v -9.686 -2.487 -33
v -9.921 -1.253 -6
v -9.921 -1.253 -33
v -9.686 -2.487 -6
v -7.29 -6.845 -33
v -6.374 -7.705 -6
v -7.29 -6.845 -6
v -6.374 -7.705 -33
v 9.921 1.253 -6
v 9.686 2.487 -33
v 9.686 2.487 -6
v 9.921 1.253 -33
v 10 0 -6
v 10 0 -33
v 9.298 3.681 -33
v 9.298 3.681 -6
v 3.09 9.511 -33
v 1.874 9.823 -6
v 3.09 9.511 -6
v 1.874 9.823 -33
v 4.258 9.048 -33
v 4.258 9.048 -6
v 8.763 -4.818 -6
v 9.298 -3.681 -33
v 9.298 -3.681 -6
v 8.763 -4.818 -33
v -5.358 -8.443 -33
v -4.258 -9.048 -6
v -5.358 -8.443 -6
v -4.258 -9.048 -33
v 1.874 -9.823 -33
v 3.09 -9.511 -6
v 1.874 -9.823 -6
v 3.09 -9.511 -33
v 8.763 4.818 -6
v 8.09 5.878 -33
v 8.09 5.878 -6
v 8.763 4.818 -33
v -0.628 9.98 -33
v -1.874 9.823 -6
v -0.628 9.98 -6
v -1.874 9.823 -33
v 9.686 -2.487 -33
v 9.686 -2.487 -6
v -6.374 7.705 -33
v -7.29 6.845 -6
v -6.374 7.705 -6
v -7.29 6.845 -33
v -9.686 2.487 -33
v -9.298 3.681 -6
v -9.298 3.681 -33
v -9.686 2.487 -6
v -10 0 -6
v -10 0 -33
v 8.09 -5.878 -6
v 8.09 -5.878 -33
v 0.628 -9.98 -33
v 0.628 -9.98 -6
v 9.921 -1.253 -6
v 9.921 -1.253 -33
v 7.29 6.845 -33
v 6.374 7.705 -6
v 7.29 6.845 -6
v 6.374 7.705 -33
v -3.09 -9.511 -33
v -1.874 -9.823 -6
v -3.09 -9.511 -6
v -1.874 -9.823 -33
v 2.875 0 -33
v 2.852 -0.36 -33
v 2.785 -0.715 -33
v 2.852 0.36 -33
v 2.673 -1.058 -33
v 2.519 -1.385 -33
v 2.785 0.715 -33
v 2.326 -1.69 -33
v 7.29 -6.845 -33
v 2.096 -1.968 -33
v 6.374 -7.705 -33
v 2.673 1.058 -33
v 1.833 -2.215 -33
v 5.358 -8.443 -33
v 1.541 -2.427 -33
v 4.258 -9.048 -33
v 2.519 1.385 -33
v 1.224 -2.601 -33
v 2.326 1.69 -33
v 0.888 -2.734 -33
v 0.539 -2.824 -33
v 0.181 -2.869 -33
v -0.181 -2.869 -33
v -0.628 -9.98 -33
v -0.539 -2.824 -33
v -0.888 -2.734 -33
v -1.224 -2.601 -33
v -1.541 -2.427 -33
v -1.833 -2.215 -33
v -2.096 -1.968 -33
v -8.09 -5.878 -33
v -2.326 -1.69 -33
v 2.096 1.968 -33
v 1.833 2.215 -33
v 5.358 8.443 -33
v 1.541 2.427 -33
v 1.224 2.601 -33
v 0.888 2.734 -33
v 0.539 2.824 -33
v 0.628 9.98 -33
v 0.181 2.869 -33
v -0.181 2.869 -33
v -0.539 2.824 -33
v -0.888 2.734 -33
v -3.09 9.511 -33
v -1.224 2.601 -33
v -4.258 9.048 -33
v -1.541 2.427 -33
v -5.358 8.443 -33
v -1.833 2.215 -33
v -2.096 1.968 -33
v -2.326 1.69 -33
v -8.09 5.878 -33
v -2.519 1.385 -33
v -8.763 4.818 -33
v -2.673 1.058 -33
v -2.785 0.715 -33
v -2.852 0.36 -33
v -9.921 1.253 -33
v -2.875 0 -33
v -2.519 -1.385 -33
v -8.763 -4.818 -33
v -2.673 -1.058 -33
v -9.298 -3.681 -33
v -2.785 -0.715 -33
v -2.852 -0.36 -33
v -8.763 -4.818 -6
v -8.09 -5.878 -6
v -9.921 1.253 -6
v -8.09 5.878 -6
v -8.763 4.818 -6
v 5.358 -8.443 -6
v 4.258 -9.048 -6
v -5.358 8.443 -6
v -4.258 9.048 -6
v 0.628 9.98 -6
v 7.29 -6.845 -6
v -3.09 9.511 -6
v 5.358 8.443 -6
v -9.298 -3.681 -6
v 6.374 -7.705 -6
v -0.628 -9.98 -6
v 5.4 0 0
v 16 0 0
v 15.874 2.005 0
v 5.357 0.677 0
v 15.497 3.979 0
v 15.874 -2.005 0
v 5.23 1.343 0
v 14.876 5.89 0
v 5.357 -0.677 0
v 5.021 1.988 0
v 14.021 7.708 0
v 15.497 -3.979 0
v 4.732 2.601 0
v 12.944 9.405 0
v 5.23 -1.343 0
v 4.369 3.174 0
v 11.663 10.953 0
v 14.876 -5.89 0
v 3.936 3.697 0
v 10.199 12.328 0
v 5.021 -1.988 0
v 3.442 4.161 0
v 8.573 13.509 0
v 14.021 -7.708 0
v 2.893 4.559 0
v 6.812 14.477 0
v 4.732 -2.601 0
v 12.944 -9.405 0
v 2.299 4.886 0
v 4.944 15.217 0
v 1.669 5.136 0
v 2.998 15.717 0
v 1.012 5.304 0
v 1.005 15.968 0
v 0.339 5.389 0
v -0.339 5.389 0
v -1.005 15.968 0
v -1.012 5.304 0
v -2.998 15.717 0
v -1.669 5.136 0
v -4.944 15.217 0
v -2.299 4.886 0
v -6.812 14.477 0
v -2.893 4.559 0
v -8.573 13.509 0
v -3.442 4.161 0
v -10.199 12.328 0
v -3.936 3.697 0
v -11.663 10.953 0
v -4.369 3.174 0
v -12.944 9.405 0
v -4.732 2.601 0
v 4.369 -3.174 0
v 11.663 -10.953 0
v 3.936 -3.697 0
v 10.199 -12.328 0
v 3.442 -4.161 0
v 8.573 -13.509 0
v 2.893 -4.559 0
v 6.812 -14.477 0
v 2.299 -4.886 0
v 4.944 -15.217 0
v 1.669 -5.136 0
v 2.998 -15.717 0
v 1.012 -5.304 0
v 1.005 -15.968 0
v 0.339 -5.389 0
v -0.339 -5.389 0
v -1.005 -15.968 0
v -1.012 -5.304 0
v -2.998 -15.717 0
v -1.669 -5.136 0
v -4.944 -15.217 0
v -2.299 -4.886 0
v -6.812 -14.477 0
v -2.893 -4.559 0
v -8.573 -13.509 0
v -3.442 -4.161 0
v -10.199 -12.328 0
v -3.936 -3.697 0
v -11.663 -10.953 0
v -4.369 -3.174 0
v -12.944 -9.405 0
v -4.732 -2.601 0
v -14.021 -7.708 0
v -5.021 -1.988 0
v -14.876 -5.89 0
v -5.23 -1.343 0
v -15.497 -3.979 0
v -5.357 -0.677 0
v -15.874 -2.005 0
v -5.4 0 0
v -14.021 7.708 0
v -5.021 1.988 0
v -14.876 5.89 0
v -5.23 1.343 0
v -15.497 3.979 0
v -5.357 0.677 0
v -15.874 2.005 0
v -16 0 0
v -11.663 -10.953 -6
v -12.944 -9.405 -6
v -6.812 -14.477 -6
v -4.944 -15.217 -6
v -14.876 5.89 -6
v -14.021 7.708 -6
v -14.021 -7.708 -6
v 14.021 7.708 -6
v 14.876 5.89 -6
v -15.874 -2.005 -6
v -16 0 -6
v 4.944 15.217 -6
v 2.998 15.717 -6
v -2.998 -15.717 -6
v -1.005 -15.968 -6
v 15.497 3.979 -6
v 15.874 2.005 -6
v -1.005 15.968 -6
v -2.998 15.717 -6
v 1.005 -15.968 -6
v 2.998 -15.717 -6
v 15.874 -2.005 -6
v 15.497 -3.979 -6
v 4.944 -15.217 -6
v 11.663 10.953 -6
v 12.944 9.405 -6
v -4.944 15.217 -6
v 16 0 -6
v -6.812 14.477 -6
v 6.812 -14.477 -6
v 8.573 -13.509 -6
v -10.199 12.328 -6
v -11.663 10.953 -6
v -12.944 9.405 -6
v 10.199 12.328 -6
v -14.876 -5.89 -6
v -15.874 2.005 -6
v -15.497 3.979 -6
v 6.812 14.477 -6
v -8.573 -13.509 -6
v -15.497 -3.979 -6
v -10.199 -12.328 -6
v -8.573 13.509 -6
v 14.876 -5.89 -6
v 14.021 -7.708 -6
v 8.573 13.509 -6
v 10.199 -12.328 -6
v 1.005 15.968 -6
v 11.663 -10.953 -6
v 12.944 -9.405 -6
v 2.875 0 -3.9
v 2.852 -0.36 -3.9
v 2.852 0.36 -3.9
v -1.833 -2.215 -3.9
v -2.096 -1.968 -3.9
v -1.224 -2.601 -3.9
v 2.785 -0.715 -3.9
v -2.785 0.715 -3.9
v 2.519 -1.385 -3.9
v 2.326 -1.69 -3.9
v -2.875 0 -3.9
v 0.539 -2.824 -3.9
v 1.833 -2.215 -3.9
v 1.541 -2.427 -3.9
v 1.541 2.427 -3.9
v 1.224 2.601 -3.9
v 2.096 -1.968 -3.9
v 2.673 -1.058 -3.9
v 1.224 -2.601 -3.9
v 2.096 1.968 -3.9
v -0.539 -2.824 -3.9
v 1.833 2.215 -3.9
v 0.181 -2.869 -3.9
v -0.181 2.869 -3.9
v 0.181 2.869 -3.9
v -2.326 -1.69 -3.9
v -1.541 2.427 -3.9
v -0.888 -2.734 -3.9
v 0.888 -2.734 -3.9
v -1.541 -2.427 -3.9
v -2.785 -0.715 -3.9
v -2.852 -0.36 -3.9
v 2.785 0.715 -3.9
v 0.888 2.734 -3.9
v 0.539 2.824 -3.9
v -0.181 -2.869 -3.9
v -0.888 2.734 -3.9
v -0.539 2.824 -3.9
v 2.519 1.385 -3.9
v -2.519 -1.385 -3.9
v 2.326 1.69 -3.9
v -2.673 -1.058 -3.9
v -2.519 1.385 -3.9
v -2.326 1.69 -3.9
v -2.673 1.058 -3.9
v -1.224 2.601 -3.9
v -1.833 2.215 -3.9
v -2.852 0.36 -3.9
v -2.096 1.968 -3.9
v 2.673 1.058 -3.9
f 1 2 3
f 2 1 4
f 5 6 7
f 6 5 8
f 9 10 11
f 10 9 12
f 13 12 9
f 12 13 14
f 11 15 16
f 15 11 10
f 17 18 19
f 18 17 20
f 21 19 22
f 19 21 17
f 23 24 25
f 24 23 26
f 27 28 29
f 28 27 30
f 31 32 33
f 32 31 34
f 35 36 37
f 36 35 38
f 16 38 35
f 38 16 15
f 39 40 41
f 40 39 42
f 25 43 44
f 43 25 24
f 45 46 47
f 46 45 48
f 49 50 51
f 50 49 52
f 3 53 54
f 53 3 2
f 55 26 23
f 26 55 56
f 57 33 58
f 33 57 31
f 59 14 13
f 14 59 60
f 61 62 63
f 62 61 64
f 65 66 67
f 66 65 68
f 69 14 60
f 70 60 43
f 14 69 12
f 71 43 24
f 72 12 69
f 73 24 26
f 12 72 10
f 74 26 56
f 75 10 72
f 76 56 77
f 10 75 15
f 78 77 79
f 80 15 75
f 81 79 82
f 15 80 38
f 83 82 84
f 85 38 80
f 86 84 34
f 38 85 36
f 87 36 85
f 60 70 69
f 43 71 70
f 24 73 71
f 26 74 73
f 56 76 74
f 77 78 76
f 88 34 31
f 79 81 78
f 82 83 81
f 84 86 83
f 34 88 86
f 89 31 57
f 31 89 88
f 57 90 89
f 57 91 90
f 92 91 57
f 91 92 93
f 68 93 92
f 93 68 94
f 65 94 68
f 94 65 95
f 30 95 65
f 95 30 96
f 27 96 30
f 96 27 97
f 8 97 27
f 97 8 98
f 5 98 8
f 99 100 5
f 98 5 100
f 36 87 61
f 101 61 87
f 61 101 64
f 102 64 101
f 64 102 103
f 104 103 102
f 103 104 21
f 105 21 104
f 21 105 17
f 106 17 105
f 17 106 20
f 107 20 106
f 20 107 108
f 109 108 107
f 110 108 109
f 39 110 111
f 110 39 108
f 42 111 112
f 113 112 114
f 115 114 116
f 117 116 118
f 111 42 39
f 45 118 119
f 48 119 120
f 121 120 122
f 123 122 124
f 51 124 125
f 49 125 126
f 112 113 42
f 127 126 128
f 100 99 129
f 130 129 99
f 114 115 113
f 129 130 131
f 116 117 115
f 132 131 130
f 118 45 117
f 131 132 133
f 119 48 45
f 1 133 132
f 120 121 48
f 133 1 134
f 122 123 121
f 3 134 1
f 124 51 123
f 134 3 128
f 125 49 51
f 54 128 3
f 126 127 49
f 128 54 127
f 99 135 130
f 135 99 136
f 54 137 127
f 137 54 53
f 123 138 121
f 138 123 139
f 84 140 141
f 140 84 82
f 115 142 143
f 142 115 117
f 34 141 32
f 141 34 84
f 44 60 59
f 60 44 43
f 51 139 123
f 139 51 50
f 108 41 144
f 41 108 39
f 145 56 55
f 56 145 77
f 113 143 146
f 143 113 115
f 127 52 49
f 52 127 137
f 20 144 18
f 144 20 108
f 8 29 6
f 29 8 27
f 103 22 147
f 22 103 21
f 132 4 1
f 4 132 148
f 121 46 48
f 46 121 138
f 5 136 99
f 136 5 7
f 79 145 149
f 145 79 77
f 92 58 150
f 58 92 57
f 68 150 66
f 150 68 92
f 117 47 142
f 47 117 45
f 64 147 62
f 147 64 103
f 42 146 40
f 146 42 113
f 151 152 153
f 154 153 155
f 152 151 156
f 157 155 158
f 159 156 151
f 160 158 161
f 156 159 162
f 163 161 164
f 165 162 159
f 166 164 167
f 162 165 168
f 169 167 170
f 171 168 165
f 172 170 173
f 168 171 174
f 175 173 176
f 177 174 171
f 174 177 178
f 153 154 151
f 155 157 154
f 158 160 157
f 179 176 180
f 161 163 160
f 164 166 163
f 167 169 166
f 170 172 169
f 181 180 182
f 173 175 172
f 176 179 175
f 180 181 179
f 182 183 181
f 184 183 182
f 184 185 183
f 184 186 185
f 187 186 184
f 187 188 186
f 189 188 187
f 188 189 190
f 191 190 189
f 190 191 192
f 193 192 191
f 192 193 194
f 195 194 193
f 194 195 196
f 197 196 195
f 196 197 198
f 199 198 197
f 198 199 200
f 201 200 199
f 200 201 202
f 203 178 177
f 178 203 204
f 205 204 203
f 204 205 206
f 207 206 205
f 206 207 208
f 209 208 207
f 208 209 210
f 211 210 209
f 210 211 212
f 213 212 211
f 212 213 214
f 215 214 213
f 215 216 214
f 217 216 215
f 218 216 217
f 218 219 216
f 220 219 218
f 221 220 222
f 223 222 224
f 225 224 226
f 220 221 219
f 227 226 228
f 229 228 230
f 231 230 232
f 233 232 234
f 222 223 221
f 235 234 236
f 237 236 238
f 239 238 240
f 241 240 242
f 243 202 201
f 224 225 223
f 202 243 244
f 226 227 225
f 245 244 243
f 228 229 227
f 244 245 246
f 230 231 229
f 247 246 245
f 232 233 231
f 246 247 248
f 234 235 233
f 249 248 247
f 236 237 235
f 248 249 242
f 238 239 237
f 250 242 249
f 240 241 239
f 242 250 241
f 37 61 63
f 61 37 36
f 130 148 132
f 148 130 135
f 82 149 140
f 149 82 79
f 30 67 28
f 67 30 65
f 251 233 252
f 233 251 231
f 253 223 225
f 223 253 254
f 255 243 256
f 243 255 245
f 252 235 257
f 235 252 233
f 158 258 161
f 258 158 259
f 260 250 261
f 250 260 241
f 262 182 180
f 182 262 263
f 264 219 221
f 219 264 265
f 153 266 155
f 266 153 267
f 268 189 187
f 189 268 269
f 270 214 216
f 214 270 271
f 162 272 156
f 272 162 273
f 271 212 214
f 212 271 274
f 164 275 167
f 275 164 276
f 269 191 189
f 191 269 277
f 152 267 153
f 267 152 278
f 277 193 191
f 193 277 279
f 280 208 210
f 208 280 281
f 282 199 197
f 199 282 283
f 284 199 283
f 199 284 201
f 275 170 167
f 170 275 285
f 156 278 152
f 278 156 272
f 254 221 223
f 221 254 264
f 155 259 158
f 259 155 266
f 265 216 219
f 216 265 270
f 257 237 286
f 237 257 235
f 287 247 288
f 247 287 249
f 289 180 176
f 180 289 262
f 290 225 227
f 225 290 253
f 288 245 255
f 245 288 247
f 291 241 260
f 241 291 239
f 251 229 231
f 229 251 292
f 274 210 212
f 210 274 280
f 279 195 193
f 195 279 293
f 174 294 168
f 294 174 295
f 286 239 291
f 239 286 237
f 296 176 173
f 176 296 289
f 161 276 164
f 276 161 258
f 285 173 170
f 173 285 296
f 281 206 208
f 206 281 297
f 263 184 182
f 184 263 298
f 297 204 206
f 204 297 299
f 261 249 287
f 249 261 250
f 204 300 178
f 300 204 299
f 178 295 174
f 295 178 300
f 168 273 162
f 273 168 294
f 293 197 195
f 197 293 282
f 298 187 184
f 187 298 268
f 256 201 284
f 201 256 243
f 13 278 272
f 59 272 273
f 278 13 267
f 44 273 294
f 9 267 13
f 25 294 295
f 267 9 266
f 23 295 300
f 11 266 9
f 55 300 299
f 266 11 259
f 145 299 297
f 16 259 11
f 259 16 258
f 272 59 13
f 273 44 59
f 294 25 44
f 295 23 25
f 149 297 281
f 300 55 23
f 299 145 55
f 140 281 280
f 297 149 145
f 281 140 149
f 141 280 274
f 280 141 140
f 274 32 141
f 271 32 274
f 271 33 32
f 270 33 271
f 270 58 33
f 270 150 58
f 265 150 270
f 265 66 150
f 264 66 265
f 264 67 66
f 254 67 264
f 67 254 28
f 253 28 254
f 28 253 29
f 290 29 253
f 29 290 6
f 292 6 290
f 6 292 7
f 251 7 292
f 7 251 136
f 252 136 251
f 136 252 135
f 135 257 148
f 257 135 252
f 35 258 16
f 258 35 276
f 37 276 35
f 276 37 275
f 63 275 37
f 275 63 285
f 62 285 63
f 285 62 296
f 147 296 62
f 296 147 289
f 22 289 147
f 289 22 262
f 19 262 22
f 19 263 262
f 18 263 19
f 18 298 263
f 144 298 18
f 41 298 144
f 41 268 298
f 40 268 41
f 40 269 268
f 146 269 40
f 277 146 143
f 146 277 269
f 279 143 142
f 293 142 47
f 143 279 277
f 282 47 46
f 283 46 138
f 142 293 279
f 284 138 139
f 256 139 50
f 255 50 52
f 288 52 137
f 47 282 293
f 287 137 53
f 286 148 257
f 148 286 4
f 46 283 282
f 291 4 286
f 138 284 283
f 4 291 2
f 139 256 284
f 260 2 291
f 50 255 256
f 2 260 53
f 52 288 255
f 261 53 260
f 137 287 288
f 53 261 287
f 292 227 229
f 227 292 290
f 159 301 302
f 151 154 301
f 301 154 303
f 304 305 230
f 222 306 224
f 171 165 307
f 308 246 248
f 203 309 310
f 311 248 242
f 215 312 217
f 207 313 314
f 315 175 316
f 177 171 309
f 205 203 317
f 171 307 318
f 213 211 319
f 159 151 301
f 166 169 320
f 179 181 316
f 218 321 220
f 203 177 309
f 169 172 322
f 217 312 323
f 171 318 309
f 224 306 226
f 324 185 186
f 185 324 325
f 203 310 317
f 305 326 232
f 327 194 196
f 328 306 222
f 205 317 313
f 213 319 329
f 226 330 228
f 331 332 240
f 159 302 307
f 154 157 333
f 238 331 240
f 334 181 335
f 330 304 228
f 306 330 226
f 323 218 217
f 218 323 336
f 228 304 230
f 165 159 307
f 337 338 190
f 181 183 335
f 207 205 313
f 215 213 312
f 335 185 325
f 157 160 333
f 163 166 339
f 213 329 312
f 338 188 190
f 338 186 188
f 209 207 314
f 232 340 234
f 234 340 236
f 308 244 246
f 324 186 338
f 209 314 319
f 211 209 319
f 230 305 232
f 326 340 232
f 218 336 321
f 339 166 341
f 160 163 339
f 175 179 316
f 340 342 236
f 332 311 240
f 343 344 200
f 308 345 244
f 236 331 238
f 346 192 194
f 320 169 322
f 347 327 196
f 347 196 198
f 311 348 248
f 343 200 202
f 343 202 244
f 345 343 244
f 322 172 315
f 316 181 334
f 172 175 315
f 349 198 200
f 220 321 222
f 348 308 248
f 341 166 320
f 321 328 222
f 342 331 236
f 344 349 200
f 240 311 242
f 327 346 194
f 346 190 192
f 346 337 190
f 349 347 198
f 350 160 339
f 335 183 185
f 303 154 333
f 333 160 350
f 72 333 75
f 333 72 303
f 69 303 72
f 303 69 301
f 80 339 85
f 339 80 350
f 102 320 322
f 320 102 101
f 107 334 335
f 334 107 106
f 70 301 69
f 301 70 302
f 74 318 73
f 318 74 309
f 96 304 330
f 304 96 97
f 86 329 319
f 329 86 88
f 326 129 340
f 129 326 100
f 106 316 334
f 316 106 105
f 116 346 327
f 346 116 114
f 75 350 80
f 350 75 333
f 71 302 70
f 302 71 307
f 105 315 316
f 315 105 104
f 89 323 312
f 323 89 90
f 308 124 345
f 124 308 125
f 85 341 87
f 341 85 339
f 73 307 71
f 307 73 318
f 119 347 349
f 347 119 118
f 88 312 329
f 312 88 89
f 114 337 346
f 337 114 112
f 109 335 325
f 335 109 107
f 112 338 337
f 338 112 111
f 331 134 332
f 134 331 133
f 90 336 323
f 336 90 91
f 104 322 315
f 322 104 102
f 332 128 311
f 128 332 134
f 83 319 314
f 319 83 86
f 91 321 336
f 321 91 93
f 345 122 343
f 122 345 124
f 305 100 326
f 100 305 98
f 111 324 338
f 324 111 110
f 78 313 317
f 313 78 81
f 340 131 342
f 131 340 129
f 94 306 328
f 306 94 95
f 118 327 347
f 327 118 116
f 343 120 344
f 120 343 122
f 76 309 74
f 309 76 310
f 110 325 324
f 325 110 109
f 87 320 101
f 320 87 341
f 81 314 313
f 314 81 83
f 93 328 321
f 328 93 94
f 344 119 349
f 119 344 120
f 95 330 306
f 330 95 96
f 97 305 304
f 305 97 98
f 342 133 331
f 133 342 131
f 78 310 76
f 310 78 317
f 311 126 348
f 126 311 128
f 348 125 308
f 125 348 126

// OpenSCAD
$fn = 50;


difference() {
	union() {
		translate(v = [0, 0, -33.0000000000]) {
			cylinder(h = 33, r = 10.0000000000);
		}
		translate(v = [0, 0, -6.0000000000]) {
			cylinder(h = 6, r = 16.0000000000);
		}
	}
	union() {
		translate(v = [0, 0, 0]) {
			rotate(a = [0, 0, 0]) {
				difference() {
					union() {
						#translate(v = [0, 0, -33.0000000000]) {
							cylinder(h = 33, r = 2.6000000000);
						}
						#translate(v = [0, 0, -3.9000000000]) {
							cylinder(h = 3.9000000000, r1 = 2.8750000000, r2 = 5.4000000000);
						}
						#translate(v = [0, 0, -33.0000000000]) {
							cylinder(h = 33, r = 2.8750000000);
						}
						#translate(v = [0, 0, -33.0000000000]) {
							cylinder(h = 33, r = 2.6000000000);
						}
					}
					union();
				}
			}
		}
	}
}
